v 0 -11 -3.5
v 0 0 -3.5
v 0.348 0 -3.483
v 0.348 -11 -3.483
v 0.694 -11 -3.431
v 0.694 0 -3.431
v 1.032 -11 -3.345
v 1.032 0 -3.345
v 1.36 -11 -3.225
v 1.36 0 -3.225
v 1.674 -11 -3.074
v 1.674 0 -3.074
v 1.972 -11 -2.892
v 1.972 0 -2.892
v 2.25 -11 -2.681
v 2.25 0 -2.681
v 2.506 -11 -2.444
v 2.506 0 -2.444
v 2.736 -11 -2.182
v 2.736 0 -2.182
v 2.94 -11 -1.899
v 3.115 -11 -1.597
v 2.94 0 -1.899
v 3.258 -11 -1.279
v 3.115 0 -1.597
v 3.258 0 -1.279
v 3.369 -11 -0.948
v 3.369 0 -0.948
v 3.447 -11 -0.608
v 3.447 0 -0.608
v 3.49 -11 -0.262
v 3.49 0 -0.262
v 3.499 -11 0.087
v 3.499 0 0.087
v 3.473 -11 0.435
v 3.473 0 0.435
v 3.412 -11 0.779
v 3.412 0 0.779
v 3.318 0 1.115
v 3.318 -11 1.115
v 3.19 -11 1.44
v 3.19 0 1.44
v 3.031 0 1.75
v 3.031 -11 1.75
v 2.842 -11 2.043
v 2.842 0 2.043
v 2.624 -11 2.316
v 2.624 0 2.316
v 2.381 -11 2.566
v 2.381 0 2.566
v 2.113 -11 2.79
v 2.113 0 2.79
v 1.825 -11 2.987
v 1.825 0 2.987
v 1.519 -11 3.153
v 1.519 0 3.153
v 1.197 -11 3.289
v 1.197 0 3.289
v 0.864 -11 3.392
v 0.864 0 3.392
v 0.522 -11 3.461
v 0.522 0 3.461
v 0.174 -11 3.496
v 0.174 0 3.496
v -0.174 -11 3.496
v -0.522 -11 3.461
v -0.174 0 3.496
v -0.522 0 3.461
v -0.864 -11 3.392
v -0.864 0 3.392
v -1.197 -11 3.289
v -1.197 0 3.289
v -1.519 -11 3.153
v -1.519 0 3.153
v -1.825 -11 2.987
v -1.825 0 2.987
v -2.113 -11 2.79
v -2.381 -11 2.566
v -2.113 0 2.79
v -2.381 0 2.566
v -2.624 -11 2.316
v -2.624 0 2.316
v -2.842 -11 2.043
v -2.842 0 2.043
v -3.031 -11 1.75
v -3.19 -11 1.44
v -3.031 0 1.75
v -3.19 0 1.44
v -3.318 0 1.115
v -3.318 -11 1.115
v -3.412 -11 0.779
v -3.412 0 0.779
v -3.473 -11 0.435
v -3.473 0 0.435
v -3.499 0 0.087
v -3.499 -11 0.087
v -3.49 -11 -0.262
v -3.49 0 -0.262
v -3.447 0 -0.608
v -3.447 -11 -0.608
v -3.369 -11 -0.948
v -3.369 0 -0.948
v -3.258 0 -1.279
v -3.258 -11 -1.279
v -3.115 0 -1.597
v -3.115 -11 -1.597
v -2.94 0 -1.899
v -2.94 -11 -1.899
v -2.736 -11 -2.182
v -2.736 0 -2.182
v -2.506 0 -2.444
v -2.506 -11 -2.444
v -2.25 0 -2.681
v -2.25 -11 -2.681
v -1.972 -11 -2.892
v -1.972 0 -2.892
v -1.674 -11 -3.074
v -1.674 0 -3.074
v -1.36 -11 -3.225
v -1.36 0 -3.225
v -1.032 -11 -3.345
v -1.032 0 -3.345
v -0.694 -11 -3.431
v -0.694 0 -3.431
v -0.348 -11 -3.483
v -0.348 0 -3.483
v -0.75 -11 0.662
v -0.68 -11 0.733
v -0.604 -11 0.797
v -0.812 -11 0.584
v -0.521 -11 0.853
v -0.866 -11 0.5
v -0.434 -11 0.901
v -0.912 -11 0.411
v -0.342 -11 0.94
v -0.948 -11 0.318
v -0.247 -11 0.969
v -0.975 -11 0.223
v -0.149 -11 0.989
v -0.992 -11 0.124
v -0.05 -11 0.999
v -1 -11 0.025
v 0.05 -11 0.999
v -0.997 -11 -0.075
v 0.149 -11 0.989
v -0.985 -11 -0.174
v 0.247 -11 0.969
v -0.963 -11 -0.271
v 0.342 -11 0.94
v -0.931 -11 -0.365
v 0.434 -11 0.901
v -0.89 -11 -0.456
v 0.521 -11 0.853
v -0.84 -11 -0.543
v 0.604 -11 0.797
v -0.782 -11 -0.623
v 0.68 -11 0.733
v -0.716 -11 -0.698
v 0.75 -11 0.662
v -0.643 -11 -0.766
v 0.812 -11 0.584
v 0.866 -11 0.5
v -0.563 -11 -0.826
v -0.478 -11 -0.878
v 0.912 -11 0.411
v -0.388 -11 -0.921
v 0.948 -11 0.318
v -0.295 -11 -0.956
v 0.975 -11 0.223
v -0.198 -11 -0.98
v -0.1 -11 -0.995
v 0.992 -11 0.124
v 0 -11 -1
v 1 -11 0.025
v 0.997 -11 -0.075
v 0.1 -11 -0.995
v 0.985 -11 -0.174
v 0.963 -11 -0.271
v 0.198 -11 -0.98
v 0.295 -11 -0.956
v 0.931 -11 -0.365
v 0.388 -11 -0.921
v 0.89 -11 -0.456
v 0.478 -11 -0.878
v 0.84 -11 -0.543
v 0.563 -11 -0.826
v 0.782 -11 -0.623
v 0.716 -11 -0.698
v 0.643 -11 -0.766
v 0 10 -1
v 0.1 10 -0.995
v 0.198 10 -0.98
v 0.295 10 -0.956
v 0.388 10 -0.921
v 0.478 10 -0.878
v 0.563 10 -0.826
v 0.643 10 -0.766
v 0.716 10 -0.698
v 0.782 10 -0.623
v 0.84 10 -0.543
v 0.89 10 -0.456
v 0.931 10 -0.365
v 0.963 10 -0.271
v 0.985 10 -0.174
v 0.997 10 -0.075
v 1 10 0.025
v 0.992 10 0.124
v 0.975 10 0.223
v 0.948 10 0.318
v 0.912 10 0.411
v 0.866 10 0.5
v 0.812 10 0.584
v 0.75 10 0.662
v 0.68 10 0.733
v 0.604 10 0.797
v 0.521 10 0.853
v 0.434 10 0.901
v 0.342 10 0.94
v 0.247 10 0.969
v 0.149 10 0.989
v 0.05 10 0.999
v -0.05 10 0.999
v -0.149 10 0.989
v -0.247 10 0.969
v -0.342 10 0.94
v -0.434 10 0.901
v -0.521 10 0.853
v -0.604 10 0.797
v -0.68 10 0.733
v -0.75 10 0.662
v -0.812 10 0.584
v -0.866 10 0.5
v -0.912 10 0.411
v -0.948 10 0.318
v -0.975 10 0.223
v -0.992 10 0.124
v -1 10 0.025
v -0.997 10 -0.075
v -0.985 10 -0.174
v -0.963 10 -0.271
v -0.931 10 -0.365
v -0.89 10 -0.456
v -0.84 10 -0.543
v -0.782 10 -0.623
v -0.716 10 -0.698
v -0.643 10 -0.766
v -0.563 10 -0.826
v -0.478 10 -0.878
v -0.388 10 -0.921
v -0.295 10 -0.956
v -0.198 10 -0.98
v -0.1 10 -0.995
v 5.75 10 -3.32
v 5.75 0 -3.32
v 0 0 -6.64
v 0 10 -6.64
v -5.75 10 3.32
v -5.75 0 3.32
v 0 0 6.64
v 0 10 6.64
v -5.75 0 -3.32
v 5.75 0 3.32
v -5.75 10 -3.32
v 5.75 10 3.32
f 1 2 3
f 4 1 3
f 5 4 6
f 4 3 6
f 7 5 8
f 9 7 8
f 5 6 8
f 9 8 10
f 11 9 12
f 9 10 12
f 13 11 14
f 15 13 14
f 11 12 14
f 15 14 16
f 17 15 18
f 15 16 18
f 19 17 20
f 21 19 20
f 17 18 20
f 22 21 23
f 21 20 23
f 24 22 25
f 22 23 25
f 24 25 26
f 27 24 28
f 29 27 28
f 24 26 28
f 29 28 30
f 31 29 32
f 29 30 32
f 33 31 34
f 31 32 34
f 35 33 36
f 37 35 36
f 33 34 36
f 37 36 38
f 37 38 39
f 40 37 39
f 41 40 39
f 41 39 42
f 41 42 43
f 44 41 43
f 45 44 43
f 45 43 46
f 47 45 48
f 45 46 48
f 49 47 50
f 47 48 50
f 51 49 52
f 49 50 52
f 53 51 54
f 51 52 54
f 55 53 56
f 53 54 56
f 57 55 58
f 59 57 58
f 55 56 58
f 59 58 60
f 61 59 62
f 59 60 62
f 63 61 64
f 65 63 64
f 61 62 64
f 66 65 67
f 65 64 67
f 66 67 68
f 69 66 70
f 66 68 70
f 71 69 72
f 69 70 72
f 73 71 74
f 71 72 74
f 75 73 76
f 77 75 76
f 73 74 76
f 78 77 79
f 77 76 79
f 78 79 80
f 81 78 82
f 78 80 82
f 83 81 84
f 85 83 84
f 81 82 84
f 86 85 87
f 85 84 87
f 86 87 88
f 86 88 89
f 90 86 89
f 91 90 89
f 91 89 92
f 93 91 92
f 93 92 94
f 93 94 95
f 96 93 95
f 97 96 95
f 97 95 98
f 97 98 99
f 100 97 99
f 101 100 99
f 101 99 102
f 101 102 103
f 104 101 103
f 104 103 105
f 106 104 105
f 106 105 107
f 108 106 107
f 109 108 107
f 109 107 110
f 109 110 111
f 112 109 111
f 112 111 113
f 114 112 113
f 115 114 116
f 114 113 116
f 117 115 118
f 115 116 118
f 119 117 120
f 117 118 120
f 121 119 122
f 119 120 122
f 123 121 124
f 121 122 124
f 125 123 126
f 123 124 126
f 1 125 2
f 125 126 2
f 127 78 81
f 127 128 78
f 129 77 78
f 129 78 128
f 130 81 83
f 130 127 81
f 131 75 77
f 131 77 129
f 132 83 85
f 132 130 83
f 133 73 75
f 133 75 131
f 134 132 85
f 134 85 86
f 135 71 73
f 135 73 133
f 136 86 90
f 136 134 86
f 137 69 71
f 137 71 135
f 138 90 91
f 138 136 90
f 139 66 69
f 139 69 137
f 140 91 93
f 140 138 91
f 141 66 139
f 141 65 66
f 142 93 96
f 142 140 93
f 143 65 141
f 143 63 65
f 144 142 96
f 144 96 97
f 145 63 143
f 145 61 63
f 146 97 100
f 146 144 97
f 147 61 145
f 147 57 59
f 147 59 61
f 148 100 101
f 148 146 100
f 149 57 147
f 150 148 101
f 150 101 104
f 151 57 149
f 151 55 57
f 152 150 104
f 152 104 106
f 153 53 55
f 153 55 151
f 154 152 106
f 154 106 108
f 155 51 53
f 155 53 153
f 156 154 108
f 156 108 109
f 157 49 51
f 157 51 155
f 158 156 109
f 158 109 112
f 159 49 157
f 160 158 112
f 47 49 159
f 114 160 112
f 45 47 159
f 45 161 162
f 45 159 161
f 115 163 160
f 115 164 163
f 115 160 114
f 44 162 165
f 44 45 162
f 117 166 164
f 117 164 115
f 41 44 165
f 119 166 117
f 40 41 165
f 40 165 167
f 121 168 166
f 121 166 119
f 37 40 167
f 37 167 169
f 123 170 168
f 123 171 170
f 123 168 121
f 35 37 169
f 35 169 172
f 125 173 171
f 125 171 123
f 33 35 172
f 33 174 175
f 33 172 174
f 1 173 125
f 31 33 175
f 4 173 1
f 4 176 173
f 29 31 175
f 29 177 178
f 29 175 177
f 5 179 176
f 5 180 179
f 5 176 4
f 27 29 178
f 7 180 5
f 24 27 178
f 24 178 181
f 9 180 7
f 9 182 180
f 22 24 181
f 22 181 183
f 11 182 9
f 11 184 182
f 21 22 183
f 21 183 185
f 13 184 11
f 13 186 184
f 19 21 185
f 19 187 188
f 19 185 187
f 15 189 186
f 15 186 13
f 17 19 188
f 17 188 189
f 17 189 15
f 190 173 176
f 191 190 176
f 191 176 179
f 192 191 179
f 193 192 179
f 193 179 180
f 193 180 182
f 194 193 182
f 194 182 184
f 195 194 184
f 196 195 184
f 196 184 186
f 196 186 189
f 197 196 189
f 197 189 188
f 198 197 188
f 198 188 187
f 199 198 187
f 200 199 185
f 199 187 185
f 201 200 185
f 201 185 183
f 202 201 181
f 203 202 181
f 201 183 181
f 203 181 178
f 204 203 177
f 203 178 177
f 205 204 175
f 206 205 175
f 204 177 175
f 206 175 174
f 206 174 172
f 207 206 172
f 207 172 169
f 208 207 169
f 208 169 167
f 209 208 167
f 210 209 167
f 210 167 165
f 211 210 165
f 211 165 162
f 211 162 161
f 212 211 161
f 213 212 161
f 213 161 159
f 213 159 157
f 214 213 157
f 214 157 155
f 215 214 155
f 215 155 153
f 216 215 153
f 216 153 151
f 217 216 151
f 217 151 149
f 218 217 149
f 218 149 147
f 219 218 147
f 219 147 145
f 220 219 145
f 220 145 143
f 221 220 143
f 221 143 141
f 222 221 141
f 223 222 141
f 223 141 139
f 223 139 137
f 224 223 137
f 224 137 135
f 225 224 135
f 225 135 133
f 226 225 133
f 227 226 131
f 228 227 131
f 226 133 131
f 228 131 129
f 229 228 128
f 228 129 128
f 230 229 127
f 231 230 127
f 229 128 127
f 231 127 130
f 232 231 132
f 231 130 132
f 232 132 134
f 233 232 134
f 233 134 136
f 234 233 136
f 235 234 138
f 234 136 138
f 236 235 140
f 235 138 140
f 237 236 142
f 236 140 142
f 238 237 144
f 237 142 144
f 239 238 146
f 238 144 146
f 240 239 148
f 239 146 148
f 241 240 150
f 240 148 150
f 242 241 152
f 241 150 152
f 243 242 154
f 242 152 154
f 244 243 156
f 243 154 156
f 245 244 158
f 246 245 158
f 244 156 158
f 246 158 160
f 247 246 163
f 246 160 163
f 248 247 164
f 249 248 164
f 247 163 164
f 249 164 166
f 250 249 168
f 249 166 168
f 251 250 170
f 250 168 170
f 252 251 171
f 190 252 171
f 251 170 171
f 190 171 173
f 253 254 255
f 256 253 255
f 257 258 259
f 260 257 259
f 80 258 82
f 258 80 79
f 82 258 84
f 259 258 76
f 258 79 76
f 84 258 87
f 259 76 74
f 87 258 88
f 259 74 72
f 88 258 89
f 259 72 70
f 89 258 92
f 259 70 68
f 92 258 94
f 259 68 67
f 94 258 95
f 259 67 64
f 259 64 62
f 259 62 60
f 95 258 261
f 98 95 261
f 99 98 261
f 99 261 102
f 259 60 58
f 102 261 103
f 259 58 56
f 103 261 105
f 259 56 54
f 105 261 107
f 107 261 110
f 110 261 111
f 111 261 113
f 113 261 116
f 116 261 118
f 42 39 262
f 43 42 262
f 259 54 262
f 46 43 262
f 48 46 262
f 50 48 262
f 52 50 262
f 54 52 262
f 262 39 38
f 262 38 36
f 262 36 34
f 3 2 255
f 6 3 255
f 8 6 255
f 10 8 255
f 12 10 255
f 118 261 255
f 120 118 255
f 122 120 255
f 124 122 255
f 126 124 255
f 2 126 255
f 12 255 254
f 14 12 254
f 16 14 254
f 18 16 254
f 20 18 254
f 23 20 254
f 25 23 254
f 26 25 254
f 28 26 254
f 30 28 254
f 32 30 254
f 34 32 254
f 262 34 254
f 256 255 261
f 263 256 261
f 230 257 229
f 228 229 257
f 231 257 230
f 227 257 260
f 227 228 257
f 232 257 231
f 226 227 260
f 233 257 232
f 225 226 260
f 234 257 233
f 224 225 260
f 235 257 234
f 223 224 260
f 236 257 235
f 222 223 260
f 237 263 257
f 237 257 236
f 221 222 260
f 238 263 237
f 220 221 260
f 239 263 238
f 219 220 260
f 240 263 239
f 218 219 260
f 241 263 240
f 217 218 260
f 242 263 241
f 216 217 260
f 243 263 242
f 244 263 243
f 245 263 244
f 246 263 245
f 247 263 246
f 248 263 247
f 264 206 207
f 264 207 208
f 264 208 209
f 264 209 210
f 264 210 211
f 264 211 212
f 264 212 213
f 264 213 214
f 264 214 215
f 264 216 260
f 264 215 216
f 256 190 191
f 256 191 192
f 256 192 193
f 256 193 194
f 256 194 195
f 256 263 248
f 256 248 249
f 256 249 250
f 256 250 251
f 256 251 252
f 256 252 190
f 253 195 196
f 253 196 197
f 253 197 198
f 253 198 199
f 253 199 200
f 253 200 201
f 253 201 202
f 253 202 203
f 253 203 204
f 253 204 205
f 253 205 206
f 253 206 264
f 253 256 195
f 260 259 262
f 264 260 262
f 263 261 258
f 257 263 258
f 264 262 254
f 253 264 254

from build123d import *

# Parameters (mm, degrees)
SALIENTE_EXTRUIR1_DEPTH = 10
CROQUIS2_R              = 3.5
SALIENTE_EXTRUIR2_DEPTH = 11
CROQUIS3_R              = 1
CORTAR_EXTRUIR1_DEPTH   = 40


with BuildPart() as part:
    # Croquis1 → Saliente-Extruir1 (new body)
    with BuildSketch(Plane(origin=(0, 0, 0), x_dir=(1, 0, 0), z_dir=(0, 1, 0))):
        Polygon((0, 6.639528096), (-5.75, 3.319764048), (-5.75, -3.319764048), (0, -6.639528096), (5.75, -3.319764048), (5.75, 3.319764048), align=None)
    extrude(amount=SALIENTE_EXTRUIR1_DEPTH)

    # Croquis2 → Saliente-Extruir2 (add)
    with BuildSketch(Plane.XZ):
        with Locations(Location((0, 0, 0), (0, 0, 270))):
            Circle(CROQUIS2_R)
    extrude(amount=SALIENTE_EXTRUIR2_DEPTH)

    # Croquis3 → Cortar-Extruir1 (cut)
    with BuildSketch(Plane.XZ.offset(11)):
        with Locations(Location((0, 0, 0), (0, 0, 270))):
            Circle(CROQUIS3_R)
    extrude(amount=-CORTAR_EXTRUIR1_DEPTH, mode=Mode.SUBTRACT)


solid = part.part
